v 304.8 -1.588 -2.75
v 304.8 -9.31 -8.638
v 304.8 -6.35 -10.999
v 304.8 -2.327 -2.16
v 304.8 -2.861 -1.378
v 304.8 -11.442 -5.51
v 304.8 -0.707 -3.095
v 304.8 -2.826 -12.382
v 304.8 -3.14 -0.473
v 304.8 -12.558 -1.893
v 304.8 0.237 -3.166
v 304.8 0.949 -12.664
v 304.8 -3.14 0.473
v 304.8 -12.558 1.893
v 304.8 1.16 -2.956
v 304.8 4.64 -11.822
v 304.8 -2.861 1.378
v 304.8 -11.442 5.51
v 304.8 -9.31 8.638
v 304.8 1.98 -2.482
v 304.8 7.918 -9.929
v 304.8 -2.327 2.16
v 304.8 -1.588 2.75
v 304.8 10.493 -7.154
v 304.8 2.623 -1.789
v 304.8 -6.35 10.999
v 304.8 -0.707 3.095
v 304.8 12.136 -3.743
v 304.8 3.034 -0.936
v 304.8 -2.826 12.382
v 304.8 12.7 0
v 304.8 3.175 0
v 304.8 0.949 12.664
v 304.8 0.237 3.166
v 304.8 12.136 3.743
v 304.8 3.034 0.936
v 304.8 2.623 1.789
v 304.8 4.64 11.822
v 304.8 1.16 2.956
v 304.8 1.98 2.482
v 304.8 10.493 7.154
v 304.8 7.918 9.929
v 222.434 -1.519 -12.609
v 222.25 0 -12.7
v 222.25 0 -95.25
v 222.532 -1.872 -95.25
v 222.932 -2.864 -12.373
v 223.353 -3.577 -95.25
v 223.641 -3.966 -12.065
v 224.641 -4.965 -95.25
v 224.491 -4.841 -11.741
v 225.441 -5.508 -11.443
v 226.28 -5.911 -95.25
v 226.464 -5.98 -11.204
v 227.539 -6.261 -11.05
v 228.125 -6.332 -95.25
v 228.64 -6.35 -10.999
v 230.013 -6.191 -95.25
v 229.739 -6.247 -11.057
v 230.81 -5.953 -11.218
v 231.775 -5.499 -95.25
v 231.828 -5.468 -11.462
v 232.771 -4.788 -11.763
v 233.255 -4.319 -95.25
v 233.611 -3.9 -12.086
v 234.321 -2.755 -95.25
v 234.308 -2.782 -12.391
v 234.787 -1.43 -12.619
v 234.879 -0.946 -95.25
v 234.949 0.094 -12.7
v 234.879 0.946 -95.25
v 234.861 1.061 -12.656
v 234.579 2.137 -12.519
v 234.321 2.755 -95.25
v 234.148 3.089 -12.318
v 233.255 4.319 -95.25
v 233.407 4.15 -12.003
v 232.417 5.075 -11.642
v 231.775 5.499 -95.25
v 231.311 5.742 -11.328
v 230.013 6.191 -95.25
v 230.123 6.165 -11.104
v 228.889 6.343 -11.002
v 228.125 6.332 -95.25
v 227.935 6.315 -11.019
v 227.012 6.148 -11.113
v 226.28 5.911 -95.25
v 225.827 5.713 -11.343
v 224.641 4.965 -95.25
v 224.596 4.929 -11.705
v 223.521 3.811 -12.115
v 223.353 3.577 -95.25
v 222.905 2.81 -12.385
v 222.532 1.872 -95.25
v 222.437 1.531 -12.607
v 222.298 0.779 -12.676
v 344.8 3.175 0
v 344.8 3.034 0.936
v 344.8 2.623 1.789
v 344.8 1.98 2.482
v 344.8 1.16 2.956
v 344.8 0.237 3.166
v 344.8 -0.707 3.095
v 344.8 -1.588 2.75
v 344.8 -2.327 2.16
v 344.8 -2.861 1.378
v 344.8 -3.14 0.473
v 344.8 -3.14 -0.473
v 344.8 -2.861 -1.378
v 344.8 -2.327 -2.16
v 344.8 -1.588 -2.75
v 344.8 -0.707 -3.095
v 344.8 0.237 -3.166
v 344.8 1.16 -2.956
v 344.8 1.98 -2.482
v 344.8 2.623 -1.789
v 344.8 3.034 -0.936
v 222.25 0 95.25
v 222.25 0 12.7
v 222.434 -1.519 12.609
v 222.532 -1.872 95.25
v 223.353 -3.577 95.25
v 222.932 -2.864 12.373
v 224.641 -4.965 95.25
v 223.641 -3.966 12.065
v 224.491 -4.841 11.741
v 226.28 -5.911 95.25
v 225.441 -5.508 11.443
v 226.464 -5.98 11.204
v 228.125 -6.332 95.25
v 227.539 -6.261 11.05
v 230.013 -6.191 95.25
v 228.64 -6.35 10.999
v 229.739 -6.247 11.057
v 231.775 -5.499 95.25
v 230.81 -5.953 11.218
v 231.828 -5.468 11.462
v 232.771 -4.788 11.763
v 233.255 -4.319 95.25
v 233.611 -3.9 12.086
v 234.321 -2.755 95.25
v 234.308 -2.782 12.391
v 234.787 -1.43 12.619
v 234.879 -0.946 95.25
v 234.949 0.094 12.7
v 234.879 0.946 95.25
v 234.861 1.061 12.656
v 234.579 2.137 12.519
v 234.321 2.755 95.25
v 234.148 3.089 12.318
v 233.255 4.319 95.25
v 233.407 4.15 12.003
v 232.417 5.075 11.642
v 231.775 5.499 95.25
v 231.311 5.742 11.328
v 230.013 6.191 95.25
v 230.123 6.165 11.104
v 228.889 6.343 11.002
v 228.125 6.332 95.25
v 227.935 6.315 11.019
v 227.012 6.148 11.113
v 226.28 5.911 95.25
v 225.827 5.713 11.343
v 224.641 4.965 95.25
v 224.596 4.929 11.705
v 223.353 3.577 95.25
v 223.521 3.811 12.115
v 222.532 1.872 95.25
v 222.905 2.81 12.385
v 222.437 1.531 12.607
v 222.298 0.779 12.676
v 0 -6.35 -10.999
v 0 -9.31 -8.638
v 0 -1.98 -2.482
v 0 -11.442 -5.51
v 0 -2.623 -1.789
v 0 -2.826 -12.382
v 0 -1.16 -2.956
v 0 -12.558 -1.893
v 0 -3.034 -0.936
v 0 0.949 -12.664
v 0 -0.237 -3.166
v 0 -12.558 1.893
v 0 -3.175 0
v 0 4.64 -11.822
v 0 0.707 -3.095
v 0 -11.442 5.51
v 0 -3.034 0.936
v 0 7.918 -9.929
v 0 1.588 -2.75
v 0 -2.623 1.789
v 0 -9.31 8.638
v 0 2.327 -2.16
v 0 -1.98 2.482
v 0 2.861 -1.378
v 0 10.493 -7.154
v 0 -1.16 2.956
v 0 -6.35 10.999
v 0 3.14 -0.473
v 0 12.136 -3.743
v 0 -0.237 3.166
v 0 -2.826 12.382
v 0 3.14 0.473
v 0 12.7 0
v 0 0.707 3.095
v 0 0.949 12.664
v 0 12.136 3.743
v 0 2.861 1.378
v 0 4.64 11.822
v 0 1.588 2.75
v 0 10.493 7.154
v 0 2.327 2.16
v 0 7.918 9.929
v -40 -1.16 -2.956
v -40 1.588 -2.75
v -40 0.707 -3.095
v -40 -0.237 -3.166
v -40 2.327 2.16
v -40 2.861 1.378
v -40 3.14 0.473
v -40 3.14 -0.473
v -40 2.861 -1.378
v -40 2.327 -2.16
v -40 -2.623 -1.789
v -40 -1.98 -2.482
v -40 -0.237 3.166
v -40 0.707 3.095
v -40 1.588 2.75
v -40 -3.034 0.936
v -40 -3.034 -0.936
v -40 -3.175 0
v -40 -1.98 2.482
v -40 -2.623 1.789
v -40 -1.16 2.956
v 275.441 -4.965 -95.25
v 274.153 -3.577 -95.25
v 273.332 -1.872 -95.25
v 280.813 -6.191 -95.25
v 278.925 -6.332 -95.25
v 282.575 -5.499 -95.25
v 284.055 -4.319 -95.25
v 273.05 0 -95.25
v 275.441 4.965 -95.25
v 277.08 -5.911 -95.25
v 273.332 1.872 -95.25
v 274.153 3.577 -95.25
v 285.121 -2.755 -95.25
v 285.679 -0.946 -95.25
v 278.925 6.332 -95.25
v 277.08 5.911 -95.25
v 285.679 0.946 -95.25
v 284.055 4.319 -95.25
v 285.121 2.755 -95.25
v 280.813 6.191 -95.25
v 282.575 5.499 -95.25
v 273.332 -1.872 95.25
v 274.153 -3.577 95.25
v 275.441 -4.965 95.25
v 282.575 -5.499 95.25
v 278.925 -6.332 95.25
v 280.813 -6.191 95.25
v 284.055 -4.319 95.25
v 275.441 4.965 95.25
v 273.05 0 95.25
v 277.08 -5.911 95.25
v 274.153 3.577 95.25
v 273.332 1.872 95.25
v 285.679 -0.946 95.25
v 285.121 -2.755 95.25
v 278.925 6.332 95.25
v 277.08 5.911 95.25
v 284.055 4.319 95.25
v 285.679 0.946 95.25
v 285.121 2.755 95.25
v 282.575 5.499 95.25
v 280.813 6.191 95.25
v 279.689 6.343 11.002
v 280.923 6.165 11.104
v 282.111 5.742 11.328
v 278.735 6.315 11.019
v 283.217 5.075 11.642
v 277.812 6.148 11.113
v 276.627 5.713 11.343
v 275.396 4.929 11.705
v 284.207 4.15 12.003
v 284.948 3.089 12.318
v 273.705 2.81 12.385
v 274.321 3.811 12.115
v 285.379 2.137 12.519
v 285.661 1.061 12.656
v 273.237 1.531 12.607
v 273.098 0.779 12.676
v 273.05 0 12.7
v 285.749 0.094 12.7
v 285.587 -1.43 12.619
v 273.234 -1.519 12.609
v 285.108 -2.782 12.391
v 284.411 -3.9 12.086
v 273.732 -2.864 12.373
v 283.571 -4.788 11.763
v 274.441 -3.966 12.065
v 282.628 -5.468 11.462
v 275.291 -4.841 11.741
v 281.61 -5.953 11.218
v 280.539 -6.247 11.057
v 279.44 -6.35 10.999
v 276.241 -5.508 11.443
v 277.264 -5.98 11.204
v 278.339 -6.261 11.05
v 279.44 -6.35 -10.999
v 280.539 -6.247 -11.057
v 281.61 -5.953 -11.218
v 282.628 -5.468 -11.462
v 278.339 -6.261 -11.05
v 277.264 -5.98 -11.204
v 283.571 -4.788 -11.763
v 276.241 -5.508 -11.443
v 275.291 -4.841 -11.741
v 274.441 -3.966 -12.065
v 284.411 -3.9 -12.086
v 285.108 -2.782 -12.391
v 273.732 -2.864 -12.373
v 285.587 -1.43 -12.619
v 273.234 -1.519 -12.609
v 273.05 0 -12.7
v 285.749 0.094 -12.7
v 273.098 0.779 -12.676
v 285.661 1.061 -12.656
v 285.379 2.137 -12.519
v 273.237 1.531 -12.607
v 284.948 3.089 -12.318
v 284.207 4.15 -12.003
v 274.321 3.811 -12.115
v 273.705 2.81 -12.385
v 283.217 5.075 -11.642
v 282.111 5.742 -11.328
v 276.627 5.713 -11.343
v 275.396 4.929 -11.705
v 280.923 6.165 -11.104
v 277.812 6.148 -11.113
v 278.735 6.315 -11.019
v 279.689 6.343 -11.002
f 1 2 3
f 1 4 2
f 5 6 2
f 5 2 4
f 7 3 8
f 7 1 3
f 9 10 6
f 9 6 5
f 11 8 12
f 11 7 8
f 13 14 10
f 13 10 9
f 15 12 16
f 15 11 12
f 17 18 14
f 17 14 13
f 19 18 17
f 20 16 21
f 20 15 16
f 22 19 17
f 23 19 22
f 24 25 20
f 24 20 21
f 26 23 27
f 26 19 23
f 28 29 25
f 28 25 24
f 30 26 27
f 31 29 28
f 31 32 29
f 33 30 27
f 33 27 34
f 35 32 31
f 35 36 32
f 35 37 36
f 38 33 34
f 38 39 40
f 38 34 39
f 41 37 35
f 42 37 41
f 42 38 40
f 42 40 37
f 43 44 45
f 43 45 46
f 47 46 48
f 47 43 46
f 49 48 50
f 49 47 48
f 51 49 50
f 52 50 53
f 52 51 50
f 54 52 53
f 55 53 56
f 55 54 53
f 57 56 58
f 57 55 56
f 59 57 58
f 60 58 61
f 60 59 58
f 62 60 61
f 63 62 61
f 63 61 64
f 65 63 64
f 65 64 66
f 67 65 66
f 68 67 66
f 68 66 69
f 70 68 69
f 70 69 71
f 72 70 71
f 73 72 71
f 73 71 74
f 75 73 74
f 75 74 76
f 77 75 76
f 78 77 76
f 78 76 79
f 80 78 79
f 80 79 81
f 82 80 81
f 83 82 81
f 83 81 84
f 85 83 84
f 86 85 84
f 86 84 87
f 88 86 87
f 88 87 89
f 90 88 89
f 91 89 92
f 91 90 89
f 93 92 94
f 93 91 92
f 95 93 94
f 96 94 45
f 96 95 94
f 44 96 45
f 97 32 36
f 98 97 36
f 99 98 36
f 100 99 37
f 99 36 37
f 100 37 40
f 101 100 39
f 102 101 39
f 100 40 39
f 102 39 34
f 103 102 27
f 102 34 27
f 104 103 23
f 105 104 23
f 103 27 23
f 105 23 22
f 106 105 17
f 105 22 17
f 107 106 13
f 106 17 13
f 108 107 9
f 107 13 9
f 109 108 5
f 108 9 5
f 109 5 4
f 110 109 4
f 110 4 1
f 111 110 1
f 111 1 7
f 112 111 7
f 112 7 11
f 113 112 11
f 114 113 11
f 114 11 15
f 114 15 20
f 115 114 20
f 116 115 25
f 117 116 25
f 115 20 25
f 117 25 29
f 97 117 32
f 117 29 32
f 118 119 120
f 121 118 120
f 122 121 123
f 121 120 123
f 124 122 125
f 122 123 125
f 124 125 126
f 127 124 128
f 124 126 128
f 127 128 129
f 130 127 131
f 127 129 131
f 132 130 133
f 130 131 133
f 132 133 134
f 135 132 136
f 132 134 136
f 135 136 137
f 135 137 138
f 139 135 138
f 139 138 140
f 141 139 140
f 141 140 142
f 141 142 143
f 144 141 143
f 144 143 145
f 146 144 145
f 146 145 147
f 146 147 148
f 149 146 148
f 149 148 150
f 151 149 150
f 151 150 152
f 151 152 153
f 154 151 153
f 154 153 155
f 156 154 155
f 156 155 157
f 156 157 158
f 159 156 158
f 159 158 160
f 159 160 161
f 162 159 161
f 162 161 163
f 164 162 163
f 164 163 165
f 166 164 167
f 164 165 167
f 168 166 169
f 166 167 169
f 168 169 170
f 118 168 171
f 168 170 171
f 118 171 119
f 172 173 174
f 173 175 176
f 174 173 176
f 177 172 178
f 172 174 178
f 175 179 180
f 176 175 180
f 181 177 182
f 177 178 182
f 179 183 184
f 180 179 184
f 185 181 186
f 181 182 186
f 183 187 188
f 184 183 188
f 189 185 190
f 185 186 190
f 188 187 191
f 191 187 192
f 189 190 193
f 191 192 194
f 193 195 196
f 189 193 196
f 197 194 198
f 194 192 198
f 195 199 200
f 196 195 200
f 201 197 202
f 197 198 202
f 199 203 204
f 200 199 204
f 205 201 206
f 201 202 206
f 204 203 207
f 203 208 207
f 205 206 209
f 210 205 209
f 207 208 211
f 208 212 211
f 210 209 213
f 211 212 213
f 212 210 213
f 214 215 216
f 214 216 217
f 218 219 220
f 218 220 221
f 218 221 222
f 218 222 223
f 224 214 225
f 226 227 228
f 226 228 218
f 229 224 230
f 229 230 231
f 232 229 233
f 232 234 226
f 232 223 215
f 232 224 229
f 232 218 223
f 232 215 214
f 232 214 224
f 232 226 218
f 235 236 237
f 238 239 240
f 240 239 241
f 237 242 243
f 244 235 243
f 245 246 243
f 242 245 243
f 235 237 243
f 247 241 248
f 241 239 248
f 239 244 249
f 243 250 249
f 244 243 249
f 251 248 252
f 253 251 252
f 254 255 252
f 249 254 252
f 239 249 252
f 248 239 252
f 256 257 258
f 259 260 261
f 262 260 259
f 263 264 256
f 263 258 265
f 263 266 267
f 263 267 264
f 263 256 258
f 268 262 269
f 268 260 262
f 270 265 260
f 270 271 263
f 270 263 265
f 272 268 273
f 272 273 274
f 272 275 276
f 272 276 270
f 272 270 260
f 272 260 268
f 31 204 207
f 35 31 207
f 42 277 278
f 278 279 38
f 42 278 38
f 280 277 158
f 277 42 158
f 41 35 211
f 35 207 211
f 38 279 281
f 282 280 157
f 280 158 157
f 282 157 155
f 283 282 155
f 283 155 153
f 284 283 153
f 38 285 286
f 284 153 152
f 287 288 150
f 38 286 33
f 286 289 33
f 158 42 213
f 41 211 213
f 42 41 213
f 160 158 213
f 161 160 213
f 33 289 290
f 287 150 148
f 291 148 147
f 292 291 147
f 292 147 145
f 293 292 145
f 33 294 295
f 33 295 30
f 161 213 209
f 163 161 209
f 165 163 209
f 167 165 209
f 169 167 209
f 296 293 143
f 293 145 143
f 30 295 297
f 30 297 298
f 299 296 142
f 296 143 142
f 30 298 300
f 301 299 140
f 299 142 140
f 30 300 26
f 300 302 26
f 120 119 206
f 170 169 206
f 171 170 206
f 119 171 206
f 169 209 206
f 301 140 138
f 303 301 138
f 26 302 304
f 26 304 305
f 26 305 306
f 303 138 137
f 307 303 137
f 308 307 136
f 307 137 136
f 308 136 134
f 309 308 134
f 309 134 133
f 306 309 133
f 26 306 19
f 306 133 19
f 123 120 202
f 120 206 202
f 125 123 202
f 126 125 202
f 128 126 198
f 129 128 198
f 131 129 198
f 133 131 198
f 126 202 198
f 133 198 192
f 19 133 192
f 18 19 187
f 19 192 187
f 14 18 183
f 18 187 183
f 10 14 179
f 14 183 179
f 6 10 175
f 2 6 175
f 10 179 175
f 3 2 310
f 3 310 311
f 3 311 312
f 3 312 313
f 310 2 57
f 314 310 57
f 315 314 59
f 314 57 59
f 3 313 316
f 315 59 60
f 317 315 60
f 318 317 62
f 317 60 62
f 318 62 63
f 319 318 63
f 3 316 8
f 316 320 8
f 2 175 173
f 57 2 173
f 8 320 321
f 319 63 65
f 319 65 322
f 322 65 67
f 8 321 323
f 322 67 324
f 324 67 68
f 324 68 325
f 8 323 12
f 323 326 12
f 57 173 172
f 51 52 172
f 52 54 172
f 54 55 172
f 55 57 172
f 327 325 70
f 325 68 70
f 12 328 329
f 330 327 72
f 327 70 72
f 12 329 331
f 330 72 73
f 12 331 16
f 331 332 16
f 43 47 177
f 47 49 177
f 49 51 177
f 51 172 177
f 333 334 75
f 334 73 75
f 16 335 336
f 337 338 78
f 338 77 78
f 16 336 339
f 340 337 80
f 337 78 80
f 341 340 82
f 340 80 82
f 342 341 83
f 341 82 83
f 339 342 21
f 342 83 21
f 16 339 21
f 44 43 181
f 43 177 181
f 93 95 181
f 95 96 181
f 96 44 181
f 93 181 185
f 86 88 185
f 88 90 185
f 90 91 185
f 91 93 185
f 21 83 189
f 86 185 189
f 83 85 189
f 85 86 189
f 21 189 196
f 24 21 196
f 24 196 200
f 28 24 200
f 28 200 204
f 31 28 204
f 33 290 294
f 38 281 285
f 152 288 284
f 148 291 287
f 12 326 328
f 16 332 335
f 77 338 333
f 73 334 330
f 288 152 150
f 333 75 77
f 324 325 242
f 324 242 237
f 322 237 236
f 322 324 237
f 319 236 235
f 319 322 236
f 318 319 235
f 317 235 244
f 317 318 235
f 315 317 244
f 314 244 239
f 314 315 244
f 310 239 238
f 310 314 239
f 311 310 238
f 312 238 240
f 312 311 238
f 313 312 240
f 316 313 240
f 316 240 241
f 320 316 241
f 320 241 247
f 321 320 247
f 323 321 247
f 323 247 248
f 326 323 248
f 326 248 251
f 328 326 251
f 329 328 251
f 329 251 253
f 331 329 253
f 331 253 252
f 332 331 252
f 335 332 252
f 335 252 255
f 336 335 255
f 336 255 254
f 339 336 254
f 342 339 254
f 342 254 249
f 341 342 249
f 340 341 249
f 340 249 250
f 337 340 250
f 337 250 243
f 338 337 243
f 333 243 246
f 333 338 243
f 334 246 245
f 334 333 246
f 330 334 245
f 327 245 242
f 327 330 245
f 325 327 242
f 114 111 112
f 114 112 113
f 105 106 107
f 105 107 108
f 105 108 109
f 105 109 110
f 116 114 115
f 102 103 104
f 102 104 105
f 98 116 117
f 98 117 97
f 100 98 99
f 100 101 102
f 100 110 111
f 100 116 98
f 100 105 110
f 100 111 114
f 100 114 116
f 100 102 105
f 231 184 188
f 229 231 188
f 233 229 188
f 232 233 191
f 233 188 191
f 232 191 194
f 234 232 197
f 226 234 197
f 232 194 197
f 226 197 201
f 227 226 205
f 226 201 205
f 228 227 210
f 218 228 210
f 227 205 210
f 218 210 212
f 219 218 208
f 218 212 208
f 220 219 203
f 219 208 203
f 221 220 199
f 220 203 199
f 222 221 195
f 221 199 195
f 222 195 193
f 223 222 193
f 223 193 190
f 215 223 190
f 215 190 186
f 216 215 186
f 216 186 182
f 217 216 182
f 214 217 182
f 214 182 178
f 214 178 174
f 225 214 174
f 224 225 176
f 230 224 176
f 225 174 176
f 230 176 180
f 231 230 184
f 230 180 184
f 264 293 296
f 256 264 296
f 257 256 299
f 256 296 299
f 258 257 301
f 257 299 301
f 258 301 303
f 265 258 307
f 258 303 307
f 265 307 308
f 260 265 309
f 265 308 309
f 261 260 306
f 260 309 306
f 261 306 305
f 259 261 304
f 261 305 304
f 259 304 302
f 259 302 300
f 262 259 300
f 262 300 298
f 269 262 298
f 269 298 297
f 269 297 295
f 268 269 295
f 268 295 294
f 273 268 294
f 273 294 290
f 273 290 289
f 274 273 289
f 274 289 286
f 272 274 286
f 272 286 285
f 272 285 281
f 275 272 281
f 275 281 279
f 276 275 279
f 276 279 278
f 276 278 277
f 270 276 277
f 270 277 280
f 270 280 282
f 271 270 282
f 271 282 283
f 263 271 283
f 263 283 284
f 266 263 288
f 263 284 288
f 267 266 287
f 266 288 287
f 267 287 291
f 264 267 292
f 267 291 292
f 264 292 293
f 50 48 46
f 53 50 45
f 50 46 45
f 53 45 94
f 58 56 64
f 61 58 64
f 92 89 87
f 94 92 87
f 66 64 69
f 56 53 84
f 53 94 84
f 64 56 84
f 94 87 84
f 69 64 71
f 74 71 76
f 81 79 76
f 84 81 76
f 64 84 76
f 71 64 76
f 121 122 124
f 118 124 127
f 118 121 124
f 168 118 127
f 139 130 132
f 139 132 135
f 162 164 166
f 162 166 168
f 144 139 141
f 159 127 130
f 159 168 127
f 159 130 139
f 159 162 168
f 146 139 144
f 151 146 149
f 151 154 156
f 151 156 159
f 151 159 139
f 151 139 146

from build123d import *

# Parameters (mm, degrees)
F0_R          = 12.7
F1_DEPTH      = 304.8
F2_R          = 3.175
F3_DEPTH      = 40
F4_R          = 3.175
F5_DEPTH      = 40
F7_DEPTH      = 95.25
F7_DEPTH_BACK = 95.25


with BuildPart() as f1:
    # F0 (on Right) → F1 (new body)
    with BuildSketch(Plane.YZ):
        Circle(F0_R)
    extrude(amount=F1_DEPTH)

    # F2 (on face) → F3 (join)
    with BuildSketch(Plane(origin=(0, 0, 0), x_dir=(0, -1, 0), z_dir=(-1, 0, 0))):
        Circle(F2_R)
    extrude(amount=F3_DEPTH)

    # F4 (on face) → F5 (join)
    with BuildSketch(Plane.YZ.offset(304.8)):
        Circle(F4_R)
    extrude(amount=F5_DEPTH)

    # F6 (on Top) → F7 (join, two sides)
    with BuildSketch(Plane.XY) as f7_sk:
        with BuildLine():
            Line((228.6, 0), (234.95, 0))
            ThreePointArc((234.95, 0), (228.6, 6.35), (222.25, 0))
            Line((222.25, 0), (228.6, 0))
        make_face()
        with BuildLine():
            ThreePointArc((222.25, 0), (228.6, -6.35), (234.95, 0))
            Line((234.95, 0), (228.6, 0))
            Line((228.6, 0), (222.25, 0))
        make_face()
        with BuildLine():
            ThreePointArc((285.75, 0), (279.4, 6.35), (273.05, 0))
            ThreePointArc((273.05, 0), (279.4, -6.35), (285.75, 0))
        make_face()
    extrude(amount=F7_DEPTH)
    extrude(f7_sk.sketch, amount=-F7_DEPTH_BACK)


solid = f1.part
